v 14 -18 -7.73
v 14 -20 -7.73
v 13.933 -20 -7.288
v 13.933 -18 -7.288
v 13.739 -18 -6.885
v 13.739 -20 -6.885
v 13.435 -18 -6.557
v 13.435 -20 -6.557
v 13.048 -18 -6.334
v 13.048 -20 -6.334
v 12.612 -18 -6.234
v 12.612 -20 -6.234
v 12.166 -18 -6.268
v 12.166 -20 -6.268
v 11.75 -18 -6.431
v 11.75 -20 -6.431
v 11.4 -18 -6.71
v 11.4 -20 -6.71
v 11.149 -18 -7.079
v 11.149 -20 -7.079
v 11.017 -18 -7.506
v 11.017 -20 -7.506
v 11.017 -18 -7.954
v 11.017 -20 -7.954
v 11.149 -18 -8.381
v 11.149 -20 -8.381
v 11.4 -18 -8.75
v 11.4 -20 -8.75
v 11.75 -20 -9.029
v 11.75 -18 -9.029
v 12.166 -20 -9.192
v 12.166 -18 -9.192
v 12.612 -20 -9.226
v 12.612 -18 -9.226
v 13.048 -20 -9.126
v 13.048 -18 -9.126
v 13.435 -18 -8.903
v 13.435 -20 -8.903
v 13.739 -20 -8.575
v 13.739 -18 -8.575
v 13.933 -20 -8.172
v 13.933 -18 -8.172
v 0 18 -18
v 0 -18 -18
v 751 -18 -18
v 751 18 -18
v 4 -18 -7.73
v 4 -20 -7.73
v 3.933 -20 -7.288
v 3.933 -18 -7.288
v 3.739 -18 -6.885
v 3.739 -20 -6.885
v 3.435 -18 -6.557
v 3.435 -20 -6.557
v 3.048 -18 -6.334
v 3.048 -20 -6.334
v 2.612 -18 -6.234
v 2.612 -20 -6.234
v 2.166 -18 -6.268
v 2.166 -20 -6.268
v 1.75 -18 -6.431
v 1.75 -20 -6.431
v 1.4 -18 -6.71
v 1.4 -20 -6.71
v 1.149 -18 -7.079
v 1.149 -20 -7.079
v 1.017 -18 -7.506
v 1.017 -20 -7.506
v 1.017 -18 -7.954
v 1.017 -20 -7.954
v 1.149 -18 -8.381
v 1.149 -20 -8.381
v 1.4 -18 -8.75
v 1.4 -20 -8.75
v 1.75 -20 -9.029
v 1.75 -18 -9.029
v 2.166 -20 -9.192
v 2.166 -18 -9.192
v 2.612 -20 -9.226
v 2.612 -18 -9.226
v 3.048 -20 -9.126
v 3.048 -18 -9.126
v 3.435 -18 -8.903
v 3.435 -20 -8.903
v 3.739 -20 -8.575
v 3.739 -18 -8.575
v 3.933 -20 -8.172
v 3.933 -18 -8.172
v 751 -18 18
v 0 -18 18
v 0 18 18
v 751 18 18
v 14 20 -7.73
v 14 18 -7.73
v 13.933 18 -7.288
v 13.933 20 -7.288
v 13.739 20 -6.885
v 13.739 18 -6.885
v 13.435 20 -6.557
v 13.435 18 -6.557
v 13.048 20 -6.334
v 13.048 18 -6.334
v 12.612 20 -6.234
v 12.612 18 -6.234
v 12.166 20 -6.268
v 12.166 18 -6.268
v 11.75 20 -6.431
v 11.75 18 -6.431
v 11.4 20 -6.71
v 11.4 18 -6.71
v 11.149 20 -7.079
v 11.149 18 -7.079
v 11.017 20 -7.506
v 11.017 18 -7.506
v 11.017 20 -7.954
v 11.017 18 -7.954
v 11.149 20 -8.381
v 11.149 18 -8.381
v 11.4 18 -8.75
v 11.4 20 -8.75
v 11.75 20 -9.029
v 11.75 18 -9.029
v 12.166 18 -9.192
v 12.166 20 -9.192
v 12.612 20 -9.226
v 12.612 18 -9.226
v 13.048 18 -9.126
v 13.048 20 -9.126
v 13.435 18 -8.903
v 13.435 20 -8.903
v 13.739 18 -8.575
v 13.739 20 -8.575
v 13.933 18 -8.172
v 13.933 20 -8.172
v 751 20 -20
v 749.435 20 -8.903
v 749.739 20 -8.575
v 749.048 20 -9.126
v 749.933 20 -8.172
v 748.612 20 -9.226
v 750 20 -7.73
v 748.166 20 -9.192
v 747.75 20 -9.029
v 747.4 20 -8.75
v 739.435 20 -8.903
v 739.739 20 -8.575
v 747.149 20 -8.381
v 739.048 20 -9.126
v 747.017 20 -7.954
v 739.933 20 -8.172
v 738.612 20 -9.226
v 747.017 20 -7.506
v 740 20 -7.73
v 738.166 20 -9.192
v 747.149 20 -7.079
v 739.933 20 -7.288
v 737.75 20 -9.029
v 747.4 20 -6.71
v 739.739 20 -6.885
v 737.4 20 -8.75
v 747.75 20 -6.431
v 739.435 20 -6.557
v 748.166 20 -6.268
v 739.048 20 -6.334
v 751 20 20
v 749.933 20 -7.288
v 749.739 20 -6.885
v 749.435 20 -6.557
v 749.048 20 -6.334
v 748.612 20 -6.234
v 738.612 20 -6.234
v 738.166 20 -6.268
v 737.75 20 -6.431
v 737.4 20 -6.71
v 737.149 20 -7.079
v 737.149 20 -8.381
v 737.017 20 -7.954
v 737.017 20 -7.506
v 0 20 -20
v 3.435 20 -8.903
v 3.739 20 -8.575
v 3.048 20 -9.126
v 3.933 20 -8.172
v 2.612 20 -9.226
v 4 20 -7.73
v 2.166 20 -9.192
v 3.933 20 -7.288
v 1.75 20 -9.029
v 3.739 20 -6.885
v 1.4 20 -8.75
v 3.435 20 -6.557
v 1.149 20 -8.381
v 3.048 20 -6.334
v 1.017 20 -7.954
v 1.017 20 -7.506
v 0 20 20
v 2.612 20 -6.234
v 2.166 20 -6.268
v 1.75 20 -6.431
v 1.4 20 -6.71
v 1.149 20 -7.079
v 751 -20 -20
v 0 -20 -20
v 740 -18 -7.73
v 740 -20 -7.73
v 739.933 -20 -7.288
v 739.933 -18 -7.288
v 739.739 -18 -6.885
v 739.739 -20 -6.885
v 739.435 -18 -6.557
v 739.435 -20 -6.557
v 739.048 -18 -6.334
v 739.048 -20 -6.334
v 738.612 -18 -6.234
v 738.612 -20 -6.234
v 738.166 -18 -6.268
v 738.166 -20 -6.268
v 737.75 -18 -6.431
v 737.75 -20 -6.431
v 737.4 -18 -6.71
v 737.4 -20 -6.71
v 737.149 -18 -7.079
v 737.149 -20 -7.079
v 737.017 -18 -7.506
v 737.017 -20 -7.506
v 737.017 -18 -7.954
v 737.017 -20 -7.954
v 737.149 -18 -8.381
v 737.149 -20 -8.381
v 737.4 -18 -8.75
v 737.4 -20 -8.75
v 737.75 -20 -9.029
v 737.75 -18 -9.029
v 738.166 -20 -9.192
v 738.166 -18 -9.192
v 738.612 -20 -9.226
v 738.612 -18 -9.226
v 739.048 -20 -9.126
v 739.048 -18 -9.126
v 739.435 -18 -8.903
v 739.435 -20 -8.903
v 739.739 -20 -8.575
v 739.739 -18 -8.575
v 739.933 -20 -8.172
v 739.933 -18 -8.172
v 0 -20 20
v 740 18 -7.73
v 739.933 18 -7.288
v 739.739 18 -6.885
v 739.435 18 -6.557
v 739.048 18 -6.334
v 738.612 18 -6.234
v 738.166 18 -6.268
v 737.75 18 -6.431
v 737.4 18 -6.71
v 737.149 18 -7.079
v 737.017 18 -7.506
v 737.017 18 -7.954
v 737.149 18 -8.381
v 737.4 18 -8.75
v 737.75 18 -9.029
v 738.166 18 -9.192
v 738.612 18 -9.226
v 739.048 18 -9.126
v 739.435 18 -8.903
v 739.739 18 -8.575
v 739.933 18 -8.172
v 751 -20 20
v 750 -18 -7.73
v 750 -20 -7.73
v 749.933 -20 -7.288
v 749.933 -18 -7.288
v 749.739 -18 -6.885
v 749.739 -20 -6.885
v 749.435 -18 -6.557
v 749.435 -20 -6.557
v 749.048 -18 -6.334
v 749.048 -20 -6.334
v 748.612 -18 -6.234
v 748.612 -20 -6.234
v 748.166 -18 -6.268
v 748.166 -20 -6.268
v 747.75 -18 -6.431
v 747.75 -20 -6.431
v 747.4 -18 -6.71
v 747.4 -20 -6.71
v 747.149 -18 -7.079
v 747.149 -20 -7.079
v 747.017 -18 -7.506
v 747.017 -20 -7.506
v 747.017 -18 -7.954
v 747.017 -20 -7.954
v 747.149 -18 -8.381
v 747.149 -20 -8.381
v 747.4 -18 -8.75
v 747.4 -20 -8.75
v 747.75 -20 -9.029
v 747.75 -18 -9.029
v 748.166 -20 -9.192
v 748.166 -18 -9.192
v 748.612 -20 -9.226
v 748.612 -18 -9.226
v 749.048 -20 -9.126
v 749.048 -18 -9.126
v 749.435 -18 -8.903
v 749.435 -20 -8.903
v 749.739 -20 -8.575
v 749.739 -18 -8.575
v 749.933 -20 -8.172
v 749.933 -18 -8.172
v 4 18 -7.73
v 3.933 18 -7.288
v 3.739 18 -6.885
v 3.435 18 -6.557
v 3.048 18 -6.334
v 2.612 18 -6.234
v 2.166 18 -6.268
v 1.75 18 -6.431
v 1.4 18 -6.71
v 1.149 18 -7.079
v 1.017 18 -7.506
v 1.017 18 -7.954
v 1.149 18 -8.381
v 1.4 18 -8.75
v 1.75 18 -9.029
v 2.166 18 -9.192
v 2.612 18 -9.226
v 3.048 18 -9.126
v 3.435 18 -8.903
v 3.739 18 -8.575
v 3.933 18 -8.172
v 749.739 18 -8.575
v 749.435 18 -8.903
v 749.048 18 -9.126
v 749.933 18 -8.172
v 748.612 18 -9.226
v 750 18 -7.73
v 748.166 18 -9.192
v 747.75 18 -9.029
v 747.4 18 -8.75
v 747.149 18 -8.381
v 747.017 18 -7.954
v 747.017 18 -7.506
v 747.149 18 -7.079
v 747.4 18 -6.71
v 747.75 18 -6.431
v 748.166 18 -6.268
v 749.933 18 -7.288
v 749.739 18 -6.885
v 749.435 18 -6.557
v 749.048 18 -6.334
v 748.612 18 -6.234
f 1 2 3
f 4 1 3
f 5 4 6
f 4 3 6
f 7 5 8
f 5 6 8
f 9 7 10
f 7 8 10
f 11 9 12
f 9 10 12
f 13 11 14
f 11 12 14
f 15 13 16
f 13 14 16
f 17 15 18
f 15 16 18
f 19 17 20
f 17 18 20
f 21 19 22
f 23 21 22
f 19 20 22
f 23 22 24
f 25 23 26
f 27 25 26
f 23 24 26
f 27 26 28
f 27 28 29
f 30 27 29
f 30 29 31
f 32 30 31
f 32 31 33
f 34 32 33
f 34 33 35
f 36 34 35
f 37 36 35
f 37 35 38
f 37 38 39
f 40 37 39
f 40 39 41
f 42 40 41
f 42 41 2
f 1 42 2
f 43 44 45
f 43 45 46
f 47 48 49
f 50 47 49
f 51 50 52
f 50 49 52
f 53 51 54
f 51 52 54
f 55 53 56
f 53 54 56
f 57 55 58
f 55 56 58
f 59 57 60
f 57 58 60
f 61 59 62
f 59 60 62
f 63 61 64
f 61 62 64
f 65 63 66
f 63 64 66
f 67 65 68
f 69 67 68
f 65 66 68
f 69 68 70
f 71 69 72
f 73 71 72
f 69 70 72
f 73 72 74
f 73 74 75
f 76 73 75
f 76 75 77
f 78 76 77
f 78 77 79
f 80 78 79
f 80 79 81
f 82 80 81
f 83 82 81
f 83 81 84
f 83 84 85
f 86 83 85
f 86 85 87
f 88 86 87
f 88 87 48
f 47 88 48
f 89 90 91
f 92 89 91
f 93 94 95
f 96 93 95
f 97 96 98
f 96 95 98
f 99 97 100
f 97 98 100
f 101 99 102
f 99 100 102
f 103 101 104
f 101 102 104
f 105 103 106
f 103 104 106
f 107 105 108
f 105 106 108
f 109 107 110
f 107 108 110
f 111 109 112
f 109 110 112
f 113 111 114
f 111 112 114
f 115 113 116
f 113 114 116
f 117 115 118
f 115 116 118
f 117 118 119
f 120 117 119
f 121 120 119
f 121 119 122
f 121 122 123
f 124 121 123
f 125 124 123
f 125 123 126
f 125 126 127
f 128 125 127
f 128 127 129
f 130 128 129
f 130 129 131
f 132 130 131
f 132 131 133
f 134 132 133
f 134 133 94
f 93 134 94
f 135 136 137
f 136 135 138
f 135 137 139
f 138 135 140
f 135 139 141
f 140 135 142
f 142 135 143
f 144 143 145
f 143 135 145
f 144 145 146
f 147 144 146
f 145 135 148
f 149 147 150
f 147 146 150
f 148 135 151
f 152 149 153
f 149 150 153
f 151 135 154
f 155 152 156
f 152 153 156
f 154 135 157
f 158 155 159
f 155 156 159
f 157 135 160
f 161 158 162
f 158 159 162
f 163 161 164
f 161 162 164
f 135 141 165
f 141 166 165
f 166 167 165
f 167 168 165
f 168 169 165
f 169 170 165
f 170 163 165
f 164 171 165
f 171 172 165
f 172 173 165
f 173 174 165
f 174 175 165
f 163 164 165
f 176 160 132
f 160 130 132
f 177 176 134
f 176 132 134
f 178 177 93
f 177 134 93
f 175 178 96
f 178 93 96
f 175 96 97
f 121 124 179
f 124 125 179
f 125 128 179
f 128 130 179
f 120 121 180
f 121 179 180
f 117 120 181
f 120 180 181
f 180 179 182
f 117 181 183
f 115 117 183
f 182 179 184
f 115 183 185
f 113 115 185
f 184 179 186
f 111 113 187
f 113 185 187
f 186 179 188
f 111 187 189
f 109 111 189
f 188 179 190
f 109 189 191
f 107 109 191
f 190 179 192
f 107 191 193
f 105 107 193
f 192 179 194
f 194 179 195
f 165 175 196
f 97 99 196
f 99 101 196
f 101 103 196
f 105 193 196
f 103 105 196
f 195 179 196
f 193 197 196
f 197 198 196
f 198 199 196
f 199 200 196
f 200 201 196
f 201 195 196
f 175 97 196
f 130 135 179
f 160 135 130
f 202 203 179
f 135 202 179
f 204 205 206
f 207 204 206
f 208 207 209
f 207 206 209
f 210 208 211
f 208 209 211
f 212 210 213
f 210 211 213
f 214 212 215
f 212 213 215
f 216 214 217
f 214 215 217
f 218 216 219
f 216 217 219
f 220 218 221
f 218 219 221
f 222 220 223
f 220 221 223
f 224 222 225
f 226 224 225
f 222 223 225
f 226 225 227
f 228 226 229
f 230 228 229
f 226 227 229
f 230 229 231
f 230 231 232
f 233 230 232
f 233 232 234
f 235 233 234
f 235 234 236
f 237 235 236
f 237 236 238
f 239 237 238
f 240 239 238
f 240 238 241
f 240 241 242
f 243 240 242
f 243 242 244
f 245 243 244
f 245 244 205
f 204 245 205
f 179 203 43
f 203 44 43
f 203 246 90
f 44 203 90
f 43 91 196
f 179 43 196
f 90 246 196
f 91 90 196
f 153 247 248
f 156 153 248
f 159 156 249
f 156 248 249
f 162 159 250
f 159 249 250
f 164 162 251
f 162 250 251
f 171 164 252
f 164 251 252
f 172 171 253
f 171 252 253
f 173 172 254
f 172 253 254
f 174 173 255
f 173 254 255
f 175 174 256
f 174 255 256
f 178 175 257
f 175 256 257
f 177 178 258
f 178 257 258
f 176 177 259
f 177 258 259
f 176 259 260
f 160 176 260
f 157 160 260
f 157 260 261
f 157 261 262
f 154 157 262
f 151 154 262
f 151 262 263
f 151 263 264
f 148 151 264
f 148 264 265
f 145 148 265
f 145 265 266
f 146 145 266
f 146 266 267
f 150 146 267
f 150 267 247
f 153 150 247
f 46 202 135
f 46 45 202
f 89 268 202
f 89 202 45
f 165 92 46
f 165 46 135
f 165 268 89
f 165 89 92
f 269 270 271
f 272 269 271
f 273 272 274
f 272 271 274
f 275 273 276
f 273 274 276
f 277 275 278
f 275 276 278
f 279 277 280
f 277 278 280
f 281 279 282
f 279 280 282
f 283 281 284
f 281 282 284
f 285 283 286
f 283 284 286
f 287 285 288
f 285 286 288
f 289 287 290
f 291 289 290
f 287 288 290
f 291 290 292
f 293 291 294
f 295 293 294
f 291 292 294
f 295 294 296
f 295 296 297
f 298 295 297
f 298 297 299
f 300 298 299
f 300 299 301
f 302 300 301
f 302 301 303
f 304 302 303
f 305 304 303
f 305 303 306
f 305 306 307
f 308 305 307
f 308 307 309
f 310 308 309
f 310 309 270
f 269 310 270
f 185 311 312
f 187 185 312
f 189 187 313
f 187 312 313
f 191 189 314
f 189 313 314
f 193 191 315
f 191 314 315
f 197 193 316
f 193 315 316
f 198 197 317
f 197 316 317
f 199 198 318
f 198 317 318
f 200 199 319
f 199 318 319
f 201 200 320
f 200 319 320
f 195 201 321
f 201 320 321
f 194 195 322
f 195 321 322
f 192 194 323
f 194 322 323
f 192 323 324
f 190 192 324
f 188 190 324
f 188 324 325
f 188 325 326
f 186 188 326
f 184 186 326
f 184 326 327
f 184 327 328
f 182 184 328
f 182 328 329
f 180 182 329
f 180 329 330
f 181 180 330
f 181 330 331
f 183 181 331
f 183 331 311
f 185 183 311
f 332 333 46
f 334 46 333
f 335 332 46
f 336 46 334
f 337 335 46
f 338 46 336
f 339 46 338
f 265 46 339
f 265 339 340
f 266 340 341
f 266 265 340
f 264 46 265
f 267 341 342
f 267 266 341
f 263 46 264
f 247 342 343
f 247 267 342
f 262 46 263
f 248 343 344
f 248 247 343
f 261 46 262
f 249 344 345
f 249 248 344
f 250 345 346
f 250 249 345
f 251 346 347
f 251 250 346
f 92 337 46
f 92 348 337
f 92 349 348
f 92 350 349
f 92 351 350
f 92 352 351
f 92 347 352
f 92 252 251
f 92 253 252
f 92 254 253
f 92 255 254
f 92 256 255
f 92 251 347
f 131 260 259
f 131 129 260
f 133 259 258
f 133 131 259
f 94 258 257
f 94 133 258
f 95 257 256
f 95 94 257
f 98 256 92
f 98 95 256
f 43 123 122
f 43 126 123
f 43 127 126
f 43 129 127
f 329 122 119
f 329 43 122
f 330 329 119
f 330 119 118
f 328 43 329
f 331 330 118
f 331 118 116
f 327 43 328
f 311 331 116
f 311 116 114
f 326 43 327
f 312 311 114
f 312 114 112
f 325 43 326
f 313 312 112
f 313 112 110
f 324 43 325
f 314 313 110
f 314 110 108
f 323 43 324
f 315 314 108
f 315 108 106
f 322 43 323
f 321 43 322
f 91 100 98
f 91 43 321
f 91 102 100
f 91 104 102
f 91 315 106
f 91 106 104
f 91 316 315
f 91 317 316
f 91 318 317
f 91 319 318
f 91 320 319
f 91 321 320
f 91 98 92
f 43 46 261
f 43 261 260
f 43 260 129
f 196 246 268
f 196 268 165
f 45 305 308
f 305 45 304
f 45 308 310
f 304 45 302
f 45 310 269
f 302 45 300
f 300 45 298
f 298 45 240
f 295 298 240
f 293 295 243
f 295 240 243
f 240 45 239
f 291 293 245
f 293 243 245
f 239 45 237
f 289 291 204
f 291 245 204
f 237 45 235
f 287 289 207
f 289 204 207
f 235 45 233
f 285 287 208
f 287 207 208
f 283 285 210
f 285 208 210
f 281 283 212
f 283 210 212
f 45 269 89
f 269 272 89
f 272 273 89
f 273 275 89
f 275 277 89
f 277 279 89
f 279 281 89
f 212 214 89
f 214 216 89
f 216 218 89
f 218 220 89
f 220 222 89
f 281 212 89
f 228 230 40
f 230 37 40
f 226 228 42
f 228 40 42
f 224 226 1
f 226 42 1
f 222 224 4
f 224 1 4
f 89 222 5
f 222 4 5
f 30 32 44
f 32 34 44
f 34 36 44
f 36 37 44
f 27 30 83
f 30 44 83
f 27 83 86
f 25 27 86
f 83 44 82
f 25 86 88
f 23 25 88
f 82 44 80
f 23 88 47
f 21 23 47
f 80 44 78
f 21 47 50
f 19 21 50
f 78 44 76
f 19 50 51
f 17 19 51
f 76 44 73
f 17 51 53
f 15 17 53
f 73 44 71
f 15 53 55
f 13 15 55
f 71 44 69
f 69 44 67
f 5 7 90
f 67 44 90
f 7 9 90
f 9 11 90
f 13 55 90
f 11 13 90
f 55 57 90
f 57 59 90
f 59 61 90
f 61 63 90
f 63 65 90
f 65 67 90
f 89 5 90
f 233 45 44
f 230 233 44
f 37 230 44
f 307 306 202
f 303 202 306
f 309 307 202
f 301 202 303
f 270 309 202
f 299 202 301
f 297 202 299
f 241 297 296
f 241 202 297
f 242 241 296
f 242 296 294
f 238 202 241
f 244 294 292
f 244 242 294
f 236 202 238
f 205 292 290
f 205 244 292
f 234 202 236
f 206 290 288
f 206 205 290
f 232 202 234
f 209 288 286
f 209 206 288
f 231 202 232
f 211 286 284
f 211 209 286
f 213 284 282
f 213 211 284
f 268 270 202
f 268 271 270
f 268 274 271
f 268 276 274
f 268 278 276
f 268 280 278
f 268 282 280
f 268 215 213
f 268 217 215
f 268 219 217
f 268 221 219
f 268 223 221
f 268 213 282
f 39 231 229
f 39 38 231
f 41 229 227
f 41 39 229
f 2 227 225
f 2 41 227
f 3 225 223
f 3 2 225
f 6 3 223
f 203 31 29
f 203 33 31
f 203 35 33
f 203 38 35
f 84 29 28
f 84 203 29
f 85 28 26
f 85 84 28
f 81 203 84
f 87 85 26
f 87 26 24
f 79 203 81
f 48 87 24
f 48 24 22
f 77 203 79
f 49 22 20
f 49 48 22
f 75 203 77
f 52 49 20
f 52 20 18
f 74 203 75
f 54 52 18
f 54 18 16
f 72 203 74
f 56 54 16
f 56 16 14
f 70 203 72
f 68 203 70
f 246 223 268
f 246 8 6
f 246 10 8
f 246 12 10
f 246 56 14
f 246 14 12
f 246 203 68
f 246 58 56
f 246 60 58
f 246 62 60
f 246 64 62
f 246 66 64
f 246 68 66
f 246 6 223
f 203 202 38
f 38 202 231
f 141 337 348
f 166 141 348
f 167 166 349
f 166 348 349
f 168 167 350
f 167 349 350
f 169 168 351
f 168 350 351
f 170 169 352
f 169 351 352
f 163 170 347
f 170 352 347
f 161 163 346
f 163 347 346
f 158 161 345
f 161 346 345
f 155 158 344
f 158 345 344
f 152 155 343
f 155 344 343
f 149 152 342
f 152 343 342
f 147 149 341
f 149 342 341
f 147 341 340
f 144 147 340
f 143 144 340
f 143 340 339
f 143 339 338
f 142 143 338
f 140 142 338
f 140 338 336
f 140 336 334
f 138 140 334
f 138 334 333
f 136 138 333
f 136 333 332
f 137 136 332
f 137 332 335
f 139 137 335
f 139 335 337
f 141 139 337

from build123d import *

# Parameters (mm, degrees)
F0_W     = 40
F0_H     = 40
F0_W_2   = 36
F0_H_2   = 36
F1_DEPTH = 751
F3_D     = 3
F3_DEPTH = 50


with BuildPart() as f1:
    # F0 (on Right) → F1 (new body)
    with BuildSketch(Plane.YZ):
        Rectangle(F0_W, F0_H)
        Rectangle(F0_W_2, F0_H_2, mode=Mode.SUBTRACT)
    extrude(amount=F1_DEPTH)

    # F3
    with Locations(Plane(origin=(0, 20, 0), x_dir=(-1, 0, 0), z_dir=(0, 1, 0))):
        with Locations((-748.5, -7.73), (-738.5, -7.73), (-2.5, -7.73), (-12.5, -7.73)):
            Hole(F3_D / 2, depth=F3_DEPTH)


solid = f1.part
